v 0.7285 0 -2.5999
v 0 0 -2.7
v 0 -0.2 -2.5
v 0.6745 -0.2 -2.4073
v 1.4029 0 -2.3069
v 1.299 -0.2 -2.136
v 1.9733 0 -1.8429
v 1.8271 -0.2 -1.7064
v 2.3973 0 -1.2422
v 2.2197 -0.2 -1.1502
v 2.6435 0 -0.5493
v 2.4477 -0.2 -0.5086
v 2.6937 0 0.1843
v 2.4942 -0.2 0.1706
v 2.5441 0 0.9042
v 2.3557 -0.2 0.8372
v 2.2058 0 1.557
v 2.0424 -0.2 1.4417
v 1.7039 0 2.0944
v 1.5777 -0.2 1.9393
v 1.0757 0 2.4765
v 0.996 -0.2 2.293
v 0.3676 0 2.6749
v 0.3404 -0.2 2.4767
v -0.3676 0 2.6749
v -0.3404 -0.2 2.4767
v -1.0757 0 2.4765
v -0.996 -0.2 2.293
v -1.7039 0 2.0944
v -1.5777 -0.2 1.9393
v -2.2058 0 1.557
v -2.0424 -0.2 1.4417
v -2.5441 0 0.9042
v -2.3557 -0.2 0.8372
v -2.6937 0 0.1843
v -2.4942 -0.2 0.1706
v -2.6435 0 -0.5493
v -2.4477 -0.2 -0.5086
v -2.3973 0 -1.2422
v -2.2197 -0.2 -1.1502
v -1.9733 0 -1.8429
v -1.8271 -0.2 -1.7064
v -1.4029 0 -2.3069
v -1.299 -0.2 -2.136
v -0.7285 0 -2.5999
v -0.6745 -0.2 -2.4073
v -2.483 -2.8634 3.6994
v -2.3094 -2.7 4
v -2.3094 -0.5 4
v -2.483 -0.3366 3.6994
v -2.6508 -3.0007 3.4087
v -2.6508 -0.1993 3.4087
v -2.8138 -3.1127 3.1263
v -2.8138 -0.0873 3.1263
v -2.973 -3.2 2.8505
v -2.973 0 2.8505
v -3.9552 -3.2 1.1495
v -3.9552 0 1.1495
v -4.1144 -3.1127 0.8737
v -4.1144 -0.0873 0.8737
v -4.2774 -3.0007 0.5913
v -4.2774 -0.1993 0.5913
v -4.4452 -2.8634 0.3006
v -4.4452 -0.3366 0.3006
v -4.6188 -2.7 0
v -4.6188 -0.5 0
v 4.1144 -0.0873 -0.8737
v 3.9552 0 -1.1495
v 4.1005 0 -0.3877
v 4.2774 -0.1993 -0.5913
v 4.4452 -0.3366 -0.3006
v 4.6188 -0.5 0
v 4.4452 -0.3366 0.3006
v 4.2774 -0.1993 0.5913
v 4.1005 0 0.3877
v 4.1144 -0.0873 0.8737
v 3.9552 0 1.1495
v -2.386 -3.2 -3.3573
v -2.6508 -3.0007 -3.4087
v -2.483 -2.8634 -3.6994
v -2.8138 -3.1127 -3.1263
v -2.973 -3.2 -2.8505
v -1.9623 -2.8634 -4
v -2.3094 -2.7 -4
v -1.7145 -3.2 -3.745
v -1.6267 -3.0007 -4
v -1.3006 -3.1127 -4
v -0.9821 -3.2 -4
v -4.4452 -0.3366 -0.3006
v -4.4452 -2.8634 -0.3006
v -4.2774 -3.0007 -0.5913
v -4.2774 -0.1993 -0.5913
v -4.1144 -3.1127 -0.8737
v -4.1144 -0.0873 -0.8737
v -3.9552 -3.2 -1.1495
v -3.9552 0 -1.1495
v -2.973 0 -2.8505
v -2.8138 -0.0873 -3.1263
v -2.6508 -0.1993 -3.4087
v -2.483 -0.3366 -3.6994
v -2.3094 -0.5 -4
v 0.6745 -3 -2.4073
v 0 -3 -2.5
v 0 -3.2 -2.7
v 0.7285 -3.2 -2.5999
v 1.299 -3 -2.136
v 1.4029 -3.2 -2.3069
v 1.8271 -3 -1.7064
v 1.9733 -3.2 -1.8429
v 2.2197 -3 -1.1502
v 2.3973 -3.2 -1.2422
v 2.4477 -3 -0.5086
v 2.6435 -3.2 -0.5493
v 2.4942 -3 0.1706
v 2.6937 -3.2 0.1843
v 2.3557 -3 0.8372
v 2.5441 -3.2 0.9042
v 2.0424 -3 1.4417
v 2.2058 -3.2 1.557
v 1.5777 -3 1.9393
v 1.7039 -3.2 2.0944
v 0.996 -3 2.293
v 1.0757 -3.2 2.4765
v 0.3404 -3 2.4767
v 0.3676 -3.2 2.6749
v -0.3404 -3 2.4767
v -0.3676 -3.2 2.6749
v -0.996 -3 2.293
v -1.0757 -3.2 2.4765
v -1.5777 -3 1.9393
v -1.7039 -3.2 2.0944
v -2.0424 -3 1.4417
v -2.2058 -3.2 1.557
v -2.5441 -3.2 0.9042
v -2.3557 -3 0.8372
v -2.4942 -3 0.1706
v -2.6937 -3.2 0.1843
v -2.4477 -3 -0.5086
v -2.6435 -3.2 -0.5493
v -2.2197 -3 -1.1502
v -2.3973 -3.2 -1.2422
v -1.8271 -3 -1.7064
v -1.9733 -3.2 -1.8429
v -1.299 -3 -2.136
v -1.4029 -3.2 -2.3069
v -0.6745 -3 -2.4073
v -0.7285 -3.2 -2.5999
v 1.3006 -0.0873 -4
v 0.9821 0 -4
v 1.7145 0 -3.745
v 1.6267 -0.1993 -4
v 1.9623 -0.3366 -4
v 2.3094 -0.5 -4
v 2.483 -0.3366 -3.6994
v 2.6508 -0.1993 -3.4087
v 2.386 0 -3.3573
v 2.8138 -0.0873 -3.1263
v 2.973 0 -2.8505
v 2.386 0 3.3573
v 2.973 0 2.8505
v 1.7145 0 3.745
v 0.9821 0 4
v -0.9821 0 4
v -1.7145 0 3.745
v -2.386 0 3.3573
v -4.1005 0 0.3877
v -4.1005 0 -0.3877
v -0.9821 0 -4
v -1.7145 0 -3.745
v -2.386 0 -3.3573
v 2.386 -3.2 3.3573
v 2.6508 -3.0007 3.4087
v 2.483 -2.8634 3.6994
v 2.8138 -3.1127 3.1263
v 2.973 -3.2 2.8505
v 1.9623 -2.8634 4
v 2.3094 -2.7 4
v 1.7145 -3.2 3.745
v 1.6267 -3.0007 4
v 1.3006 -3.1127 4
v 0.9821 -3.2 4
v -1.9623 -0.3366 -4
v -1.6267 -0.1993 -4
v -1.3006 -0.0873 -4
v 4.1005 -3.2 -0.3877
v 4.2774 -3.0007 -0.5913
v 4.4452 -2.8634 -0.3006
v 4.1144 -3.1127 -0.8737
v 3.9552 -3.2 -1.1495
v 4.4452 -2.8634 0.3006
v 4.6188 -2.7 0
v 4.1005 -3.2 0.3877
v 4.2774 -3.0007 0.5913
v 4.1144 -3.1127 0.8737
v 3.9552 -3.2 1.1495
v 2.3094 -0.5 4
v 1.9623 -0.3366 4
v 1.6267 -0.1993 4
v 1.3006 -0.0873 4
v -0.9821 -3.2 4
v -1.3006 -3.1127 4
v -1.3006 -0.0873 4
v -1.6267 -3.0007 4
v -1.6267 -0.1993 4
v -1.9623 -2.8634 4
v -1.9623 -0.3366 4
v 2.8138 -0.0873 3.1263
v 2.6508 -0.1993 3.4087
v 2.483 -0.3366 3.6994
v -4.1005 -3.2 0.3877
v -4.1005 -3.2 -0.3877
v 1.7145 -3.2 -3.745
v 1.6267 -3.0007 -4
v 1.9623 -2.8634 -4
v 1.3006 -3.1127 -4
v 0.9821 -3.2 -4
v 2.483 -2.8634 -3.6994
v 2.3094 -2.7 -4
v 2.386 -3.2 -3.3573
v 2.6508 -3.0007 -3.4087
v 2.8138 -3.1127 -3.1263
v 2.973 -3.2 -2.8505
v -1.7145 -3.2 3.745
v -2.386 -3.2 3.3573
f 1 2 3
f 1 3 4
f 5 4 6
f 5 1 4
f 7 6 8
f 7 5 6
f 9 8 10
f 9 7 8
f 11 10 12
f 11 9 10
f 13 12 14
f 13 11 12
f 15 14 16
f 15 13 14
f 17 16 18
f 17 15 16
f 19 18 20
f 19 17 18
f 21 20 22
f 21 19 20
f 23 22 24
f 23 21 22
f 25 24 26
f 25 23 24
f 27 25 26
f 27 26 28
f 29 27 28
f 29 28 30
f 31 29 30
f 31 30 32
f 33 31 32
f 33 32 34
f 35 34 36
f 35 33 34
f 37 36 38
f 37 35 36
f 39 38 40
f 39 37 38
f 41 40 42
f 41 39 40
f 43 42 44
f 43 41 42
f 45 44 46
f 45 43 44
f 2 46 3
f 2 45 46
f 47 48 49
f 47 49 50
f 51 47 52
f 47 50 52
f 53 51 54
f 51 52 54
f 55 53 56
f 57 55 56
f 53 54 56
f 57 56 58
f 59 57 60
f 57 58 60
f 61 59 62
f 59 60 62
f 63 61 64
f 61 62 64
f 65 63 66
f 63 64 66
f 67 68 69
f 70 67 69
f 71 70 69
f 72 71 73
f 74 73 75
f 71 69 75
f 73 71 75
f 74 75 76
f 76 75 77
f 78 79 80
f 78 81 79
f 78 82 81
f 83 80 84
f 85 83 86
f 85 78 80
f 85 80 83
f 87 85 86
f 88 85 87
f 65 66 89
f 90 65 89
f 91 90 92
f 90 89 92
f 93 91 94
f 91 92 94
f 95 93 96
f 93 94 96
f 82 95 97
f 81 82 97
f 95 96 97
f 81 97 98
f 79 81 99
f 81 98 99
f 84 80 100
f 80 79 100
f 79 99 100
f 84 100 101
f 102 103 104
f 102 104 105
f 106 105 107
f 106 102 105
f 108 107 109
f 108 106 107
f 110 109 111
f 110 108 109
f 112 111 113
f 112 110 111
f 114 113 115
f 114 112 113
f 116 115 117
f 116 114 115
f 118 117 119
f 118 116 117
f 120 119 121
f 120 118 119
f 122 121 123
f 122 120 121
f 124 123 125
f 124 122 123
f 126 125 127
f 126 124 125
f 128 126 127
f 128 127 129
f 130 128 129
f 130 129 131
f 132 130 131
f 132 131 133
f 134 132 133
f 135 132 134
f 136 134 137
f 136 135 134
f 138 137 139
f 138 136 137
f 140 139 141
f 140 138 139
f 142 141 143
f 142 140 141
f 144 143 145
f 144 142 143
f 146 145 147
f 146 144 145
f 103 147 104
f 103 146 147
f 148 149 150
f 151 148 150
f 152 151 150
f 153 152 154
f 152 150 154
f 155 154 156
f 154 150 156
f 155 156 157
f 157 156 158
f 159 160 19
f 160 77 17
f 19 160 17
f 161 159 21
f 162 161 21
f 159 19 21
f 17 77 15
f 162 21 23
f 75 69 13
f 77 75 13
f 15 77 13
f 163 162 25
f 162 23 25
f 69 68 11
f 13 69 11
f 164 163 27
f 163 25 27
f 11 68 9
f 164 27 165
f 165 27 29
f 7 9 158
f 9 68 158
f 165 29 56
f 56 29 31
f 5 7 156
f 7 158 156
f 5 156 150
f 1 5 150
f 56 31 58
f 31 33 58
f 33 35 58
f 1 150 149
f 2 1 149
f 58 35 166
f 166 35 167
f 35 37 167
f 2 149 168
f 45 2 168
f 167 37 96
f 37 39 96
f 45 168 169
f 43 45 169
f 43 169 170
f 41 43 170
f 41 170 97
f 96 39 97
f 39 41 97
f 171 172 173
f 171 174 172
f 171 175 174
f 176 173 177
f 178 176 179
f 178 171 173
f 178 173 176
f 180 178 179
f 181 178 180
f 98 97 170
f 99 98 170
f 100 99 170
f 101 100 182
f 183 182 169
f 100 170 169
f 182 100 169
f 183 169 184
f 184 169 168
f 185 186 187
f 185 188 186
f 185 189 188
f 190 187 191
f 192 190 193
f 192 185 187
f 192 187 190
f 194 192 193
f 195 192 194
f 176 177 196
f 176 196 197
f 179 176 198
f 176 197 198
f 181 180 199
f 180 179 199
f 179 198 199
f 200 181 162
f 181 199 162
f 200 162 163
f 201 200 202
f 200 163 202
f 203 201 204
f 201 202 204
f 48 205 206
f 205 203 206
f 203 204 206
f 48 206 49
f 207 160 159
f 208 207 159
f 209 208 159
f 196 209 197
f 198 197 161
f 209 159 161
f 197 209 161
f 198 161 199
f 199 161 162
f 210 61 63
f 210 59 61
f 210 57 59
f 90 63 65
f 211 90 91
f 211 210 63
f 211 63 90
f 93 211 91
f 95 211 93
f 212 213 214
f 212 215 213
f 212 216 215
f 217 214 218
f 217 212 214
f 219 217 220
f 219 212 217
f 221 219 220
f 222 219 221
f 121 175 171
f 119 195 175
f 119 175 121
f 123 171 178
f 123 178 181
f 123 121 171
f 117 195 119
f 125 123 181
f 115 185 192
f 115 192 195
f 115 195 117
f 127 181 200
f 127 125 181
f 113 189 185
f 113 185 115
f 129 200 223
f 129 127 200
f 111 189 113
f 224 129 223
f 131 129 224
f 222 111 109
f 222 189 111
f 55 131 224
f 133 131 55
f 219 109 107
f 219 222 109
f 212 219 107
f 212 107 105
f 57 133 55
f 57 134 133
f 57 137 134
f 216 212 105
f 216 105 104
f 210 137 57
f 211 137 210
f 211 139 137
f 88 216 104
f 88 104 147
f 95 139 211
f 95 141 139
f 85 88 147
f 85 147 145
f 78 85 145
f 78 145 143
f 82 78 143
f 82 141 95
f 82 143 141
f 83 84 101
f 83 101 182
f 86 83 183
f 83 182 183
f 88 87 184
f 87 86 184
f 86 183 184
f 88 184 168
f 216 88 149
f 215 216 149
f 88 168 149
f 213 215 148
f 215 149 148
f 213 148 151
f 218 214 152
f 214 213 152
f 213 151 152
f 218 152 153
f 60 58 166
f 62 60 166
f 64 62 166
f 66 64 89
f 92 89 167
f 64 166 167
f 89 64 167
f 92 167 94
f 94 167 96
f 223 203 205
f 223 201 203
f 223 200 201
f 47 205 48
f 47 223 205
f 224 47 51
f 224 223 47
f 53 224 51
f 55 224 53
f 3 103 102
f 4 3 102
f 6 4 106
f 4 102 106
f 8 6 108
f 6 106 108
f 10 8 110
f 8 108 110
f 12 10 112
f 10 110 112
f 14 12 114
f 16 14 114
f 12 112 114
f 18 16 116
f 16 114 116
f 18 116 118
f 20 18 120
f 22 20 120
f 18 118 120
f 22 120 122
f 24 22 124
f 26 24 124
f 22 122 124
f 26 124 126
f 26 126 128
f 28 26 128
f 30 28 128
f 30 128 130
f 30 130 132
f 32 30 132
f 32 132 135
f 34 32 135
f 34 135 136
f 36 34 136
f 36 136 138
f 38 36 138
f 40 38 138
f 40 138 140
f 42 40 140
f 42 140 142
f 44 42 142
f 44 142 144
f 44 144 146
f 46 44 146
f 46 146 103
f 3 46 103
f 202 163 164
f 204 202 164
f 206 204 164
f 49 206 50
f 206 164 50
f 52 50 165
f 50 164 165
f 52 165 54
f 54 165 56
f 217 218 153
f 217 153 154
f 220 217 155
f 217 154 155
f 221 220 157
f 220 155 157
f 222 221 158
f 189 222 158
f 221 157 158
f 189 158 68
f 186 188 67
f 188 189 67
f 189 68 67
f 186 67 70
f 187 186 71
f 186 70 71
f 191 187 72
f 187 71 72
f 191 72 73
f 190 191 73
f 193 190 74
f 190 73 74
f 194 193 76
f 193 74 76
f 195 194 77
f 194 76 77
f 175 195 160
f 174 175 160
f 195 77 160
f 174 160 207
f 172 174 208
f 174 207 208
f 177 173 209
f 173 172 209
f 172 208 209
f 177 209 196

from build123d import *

# Parameters (mm, degrees)
EXTRUDE_1_DEPTH     = 3.2
SKETCH_5_R          = 2.5
CUT_EXTRUDE_1_DEPTH = 7.897342483
CHAMFER_1_SIZE      = 0.2


with BuildPart() as part:
    # Эскиз1 → Вытянуть1 (new body)
    with BuildSketch(Plane(origin=(0, 0, 0), x_dir=(1, 0, 0), z_dir=(0, 1, 0))):
        Polygon((-2.309401077, 4), (2.309401077, 4), (4.618802154, 0), (2.309401077, -4), (-2.309401077, -4), (-4.618802154, 0), align=None)
    extrude(amount=-EXTRUDE_1_DEPTH)

    # Эскиз5 → Вырез-Вытянуть1 (cut, through all)
    with BuildSketch(Plane.XZ.offset(3.2)):
        with Locations(Location((0, 0, 0), (0, 0, 270))):
            Circle(SKETCH_5_R)
    extrude(amount=-CUT_EXTRUDE_1_DEPTH, mode=Mode.SUBTRACT)

    # Эскиз4 → Вырез-Повернуть1 (revolve, cut)
    with BuildSketch(Plane.XY):
        Polygon((-4.618802154, -0.5), (-4.118802154, 0), (-4.618802154, 0), align=None)
        Polygon((-4.618802154, -2.7), (-4.118802154, -3.2), (-4.618802154, -3.2), align=None)
    revolve(axis=Axis((0, 0, 0), (0, -1, 0)), mode=Mode.SUBTRACT)

    # Фаска1
    chamfer_1_edges = [part.edges().sort_by_distance(p)[0] for p in [
        (0, 0, 2.5),
        (0, -3.2, 2.5),
    ]]
    chamfer(chamfer_1_edges, length=CHAMFER_1_SIZE)


solid = part.part
